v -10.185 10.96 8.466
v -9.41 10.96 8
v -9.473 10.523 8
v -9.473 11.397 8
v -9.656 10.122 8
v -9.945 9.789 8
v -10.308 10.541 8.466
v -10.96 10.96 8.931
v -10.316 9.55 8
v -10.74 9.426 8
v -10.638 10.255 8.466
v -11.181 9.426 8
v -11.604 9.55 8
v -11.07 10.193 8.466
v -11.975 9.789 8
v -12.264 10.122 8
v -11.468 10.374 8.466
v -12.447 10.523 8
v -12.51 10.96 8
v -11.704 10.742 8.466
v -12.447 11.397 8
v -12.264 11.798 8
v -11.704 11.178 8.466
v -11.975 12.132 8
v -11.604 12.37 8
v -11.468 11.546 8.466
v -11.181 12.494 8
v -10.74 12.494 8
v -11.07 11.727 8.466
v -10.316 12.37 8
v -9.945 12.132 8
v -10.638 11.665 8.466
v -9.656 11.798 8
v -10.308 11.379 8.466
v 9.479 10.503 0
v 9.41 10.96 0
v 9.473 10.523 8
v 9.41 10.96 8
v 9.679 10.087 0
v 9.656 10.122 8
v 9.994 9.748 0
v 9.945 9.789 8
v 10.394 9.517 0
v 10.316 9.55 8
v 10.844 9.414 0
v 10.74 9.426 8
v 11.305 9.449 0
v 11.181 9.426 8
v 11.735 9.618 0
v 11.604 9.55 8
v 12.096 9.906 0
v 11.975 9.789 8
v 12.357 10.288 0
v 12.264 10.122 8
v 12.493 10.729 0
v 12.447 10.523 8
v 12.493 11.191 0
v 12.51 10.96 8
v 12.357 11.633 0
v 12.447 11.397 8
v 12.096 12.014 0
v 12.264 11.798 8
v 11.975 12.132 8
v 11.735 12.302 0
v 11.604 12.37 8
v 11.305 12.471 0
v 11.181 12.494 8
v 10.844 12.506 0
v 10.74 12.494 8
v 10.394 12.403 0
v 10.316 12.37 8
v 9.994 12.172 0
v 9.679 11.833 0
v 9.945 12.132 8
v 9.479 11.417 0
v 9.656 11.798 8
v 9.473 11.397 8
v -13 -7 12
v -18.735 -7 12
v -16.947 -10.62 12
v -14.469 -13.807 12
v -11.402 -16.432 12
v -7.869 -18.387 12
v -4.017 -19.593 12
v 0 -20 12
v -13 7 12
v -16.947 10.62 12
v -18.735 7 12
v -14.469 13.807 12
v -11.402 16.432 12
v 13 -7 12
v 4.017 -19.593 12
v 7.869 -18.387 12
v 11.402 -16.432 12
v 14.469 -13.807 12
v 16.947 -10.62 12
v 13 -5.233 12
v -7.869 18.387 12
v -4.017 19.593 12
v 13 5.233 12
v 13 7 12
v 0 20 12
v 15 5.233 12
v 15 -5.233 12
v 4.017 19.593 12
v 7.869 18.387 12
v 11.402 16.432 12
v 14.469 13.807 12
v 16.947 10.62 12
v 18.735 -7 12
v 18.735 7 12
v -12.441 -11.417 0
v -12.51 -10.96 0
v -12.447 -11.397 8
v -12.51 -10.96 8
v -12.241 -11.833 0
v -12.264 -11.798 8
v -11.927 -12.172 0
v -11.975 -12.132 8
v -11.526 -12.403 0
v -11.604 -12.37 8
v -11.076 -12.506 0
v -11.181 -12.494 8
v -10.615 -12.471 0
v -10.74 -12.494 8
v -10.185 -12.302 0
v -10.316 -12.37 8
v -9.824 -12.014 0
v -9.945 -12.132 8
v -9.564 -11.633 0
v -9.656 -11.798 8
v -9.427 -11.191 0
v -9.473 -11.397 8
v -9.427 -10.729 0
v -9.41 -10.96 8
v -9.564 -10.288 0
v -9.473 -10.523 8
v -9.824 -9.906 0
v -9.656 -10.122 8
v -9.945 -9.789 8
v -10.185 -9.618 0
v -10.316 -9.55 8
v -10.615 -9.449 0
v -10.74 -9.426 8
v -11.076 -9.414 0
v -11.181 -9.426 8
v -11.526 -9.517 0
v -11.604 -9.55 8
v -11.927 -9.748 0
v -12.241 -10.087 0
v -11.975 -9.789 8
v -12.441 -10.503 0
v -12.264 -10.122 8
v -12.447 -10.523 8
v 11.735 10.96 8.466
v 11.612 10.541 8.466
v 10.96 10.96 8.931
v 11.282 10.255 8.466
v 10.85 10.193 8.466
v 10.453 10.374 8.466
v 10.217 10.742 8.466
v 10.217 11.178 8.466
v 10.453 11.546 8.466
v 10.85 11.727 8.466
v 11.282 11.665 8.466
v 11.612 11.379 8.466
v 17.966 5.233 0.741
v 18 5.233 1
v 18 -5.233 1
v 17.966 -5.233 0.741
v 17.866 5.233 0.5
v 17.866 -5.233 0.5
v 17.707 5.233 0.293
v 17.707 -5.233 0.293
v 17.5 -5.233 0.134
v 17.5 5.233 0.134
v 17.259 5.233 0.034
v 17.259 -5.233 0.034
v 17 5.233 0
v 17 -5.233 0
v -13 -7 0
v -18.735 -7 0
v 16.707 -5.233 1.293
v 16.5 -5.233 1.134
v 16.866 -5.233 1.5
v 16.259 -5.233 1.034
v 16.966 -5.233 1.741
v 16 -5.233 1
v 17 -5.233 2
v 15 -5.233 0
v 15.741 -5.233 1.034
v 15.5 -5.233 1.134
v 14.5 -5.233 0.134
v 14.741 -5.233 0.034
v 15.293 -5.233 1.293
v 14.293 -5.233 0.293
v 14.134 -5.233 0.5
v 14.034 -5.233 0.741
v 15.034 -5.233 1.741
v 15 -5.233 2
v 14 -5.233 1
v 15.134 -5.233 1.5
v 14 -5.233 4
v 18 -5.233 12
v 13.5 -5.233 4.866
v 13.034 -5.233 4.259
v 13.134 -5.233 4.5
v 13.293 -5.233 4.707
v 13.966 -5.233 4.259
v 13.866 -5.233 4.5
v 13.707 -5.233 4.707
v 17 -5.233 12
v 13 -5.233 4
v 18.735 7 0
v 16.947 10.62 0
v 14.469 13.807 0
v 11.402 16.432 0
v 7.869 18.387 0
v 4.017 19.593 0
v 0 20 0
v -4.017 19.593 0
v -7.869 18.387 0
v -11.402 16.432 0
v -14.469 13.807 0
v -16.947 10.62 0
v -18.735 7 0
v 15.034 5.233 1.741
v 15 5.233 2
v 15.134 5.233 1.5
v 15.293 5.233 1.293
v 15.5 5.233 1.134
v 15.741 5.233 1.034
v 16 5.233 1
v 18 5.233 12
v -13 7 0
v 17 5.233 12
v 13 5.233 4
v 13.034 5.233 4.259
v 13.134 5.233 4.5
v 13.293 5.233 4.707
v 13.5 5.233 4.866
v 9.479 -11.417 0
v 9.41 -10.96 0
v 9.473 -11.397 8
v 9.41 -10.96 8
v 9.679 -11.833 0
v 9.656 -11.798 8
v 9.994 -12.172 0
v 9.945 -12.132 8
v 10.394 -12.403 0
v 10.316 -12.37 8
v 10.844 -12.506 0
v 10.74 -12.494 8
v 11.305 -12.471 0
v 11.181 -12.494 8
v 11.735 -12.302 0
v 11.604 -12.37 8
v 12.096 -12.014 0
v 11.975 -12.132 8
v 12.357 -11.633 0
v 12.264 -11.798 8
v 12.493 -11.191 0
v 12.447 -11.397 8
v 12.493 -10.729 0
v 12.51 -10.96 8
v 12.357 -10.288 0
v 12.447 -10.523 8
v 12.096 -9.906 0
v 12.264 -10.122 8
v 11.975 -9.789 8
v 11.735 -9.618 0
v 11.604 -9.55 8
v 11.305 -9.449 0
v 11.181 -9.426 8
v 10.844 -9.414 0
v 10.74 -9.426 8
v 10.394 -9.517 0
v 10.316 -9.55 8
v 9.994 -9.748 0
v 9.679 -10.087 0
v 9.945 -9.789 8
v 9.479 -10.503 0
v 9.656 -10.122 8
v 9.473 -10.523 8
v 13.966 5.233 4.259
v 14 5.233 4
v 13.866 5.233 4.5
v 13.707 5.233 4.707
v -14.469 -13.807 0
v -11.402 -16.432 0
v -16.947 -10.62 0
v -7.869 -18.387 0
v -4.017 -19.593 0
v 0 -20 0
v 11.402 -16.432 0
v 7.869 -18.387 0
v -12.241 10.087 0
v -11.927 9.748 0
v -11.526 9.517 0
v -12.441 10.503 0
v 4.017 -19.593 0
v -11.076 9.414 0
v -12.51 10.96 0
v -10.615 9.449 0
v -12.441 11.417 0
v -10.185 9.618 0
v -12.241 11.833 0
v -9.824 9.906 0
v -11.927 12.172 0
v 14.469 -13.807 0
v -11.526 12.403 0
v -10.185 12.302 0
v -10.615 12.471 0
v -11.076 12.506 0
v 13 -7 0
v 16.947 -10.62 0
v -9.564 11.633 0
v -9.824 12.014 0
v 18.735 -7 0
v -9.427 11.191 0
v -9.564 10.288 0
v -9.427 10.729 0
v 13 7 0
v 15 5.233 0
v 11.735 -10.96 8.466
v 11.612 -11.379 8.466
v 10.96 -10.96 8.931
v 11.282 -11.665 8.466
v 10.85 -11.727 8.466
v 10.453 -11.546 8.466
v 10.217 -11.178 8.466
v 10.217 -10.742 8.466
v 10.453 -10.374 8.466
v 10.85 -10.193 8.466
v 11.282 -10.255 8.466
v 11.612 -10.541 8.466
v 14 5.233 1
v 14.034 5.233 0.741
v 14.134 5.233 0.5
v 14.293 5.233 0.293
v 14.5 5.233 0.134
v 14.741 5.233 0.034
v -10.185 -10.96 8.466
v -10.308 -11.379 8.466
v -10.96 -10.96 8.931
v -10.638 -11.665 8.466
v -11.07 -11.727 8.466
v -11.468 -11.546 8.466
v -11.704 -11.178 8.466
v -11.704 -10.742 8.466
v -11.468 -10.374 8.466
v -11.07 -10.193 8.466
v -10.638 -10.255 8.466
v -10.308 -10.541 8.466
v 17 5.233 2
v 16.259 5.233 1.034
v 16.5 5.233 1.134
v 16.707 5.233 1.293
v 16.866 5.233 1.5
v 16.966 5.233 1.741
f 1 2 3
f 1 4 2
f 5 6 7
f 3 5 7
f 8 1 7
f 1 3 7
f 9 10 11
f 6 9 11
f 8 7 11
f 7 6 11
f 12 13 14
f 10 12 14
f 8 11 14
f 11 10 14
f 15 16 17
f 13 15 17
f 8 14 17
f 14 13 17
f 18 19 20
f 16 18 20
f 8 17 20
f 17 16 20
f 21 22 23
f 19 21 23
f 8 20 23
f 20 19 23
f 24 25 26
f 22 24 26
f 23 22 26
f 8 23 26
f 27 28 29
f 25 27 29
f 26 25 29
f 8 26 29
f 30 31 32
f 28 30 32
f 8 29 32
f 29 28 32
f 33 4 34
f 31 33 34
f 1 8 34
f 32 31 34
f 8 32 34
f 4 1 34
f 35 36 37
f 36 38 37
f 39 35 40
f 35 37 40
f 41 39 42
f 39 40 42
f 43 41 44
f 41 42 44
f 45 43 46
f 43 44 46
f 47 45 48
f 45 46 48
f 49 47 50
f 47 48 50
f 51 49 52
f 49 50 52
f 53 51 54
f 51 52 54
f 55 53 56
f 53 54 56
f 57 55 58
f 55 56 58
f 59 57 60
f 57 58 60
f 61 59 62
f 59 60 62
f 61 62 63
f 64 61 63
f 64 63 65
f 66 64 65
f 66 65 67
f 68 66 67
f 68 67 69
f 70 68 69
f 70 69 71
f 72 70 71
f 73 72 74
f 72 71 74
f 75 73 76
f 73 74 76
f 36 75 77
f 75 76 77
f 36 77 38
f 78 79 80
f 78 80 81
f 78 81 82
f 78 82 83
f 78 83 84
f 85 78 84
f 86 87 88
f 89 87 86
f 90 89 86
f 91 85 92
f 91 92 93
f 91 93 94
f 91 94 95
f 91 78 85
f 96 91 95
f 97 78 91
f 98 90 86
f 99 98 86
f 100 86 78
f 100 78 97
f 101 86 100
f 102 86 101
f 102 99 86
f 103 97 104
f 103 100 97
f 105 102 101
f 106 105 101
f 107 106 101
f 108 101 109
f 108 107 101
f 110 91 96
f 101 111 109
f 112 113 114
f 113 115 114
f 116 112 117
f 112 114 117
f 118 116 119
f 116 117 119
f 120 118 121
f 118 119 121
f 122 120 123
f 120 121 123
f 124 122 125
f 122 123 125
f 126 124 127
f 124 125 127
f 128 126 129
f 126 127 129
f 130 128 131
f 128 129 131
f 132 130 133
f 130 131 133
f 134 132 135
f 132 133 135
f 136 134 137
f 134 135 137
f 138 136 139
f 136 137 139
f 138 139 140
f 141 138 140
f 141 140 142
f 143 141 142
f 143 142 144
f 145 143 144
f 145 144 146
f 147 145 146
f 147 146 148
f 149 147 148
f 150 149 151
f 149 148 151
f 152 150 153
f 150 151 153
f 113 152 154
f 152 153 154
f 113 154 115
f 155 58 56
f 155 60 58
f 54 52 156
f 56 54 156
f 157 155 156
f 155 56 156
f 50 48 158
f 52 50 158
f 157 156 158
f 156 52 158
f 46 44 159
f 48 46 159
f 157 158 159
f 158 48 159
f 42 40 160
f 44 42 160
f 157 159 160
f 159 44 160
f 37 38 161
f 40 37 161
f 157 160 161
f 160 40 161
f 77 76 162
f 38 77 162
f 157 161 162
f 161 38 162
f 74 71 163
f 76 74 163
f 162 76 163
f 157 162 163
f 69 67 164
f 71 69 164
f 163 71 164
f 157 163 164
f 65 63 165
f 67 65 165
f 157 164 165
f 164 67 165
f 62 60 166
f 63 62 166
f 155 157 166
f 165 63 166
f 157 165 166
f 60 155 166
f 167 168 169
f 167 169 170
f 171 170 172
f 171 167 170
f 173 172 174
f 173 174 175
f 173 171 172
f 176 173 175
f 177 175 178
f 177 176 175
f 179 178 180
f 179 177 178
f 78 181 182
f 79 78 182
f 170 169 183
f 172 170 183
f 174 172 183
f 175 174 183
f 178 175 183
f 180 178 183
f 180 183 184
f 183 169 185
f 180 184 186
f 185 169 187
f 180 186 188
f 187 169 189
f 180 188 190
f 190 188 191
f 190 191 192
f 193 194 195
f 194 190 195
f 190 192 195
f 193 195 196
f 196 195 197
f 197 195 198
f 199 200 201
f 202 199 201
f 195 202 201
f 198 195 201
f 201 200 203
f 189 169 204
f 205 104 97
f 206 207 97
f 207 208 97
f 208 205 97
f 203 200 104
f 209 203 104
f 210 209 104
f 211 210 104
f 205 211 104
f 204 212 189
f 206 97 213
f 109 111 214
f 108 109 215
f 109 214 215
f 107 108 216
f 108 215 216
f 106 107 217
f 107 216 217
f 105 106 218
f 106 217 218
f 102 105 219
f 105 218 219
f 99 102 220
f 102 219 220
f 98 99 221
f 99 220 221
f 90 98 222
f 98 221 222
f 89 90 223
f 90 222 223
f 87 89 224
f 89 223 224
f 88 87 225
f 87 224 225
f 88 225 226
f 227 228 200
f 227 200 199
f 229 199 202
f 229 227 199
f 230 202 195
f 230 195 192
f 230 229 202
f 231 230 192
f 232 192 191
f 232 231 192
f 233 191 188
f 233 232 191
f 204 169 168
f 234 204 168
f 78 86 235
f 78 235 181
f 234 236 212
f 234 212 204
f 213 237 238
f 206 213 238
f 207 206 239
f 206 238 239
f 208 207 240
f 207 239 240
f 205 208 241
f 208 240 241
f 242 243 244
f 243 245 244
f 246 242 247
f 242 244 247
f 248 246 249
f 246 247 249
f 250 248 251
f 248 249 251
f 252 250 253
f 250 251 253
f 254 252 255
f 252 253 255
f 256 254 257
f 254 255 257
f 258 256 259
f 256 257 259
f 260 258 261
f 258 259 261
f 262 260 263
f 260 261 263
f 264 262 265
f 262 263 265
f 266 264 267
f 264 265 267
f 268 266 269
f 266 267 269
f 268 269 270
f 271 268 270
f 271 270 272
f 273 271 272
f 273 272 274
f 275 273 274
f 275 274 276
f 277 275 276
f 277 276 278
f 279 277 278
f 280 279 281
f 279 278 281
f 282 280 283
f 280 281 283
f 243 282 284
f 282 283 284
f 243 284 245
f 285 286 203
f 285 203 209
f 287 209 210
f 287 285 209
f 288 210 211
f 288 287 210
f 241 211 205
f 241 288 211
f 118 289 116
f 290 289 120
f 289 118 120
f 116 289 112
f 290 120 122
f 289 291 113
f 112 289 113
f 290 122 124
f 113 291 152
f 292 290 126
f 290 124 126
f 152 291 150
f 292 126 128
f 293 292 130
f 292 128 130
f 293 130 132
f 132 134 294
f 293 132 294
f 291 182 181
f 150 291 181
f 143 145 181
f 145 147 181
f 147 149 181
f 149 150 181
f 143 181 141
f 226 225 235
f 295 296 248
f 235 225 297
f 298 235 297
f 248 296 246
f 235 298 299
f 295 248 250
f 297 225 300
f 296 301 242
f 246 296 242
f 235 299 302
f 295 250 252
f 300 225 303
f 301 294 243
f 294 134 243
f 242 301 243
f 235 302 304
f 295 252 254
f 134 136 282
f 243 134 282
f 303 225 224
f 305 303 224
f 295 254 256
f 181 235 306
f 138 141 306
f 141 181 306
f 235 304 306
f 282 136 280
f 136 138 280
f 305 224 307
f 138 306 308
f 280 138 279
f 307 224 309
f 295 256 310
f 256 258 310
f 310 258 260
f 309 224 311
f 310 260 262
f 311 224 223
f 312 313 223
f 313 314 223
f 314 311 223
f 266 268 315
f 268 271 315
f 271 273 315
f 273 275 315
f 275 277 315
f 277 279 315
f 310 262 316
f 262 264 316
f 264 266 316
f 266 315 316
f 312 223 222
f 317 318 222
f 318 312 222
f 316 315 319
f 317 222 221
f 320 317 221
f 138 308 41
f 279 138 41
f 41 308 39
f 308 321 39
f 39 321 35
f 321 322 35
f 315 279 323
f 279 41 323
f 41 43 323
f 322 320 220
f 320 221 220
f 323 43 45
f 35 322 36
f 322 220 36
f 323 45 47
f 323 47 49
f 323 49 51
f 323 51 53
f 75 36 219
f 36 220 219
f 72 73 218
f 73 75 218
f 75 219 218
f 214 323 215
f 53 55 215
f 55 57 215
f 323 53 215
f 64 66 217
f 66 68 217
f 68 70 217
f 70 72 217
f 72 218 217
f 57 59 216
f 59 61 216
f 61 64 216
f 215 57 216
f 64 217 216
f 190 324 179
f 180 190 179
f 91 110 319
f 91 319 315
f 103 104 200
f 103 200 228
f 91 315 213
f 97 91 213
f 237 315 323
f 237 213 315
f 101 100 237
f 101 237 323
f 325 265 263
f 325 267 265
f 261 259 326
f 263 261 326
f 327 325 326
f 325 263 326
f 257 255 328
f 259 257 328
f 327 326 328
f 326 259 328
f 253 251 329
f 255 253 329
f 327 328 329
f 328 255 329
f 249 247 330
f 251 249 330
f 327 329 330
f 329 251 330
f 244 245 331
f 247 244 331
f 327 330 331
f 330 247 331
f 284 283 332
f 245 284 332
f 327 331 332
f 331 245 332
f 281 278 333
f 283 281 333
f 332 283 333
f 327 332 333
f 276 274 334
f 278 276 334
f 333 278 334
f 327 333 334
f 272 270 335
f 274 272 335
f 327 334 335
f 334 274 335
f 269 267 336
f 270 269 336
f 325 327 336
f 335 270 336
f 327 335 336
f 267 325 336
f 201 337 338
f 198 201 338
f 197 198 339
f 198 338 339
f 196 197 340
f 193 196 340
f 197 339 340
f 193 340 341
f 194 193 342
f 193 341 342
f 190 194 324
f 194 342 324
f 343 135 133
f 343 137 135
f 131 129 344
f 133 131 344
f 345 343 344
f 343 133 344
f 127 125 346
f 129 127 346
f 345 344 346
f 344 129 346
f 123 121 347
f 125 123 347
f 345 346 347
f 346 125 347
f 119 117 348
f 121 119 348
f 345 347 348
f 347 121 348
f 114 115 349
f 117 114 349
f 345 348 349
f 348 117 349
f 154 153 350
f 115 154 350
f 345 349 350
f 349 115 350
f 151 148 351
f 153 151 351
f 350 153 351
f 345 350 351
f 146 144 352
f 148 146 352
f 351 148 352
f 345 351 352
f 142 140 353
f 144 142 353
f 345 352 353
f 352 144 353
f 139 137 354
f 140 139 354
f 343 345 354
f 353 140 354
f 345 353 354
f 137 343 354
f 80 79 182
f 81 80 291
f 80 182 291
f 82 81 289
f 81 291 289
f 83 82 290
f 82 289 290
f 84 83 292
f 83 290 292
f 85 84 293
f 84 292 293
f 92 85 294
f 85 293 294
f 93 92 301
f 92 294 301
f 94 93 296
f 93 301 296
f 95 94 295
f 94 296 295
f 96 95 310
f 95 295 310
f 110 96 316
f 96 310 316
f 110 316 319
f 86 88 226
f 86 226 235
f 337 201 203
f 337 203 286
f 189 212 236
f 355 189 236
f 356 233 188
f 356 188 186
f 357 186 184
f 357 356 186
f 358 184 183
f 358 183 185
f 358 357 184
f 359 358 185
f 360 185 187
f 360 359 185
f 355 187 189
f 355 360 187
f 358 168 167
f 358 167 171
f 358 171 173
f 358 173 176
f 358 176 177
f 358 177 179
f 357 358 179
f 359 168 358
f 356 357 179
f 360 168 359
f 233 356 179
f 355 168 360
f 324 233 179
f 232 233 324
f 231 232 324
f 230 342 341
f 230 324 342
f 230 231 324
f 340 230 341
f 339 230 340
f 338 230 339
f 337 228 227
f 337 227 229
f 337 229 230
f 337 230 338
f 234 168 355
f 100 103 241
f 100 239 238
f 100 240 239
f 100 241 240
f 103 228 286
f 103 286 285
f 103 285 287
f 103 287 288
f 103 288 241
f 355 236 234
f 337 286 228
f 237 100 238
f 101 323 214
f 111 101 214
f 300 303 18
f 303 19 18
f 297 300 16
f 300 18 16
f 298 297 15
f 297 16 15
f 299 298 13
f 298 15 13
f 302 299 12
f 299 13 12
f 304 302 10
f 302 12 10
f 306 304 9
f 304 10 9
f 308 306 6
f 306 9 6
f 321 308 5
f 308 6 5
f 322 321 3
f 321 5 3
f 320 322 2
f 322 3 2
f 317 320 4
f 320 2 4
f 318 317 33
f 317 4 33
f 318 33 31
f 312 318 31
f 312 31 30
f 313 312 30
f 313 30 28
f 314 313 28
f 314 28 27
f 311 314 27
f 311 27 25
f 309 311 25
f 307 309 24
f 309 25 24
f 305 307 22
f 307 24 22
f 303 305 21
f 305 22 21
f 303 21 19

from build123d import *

# Parameters (mm, degrees)
F0_R         = 20
F1_DEPTH     = 12
F3_D         = 3.1
F3_DEPTH     = 8
F3_TIP       = 0.9313339595
F5_DEPTH     = 12.001
F6_W         = 5
F6_H         = 10.46546828
F7_DEPTH     = 12
F8_W         = 2
F8_H         = 10.46546828
F9_DEPTH     = 11
F10_W        = 1
F10_H        = 10.46546828
F11_DEPTH    = 5
F12_T1_DEPTH = 10.46546828
F12_T3_DEPTH = 10.46546828


# Not quite as in the source:
# - a fillet or chamfer that OpenCascade refuses, or shapes differently, is made with other operations: its cross-section is extruded or revolved along the edge and cut away or added


with BuildPart() as f1:
    # F0 (on Top) → F1 (new body)
    with BuildSketch(Plane.XY):
        Circle(F0_R)
    extrude(amount=F1_DEPTH)

    # F3
    with Locations(Plane(origin=(0, 0, 0), x_dir=(1, 0, 0), z_dir=(0, 0, -1))):
        with Locations((-10.9601551084, 10.9601551084), (-10.9601551084, -10.9601551084), (10.9601551084, -10.9601551084), (10.9601551084, 10.9601551084)):
            Hole(F3_D / 2, depth=F3_DEPTH)
            with Locations((0, 0, -(F3_DEPTH + F3_TIP / 2))):  # 118° drill point
                Cone(0, F3_D / 2, F3_TIP, mode=Mode.SUBTRACT)

    # F4 (on face) → F5 (intersect, through all)
    with BuildSketch(Plane.XY.offset(12)):
        with BuildLine():
            Line((13, -7), (13, 7))
            Line((13, 7), (18.7349939952, 7))
            ThreePointArc((18.7349939952, 7), (0, 20), (-18.7349939952, 7))
            Line((-18.7349939952, 7), (-13, 7))
            Line((-13, 7), (-13, -7))
            Line((-13, -7), (-18.7349939952, -7))
            ThreePointArc((-18.7349939952, -7), (0, -20), (18.7349939952, -7))
            Line((18.7349939952, -7), (13, -7))
        make_face()
    extrude(amount=-F5_DEPTH, mode=Mode.INTERSECT)

    # F6 (on Top) → F7 (join)
    with BuildSketch(Plane.XY):
        with Locations((15.5, 0)):
            Rectangle(F6_W, F6_H)
    extrude(amount=F7_DEPTH)

    # F8 (on face) → F9 (cut)
    with BuildSketch(Plane.XY.offset(12)):
        with Locations((16, 0)):
            Rectangle(F8_W, F8_H)
    extrude(amount=-F9_DEPTH, mode=Mode.SUBTRACT)

    # F10 (on Top) → F11 (cut)
    with BuildSketch(Plane.XY):
        with Locations((13.5, 0)):
            Rectangle(F10_W, F10_H)
    extrude(amount=F11_DEPTH, mode=Mode.SUBTRACT)

    # F12: fillet of radius 1 on 6 edges, made by hand

    # F12_s2 → F12_t1 (join)
    with BuildSketch(Plane.XZ.offset(-5.23273414)):
        with BuildLine():
            ThreePointArc((15, 2), (15.2928932188, 1.2928932188), (16, 1))
            Line((16, 1), (15, 1))
            Line((15, 1), (15, 2))
        make_face()
        with BuildLine():
            ThreePointArc((16, 1), (16.7071067812, 1.2928932188), (17, 2))
            Line((17, 2), (17, 1))
            Line((17, 1), (16, 1))
        make_face()
        with BuildLine():
            ThreePointArc((14, 4), (13.7071067812, 4.7071067812), (13, 5))
            Line((13, 5), (14, 5))
            Line((14, 5), (14, 4))
        make_face()
        with BuildLine():
            ThreePointArc((13, 4), (13.2928932188, 4.7071067812), (14, 5))
            Line((14, 5), (13, 5))
            Line((13, 5), (13, 4))
        make_face()
    extrude(amount=F12_T1_DEPTH)

    # F12_s4 → F12_t3 (cut)
    with BuildSketch(Plane.XZ.offset(-5.23273414)):
        with BuildLine():
            ThreePointArc((18, 1), (17.7071067812, 0.2928932188), (17, 0))
            Line((17, 0), (18, 0))
            Line((18, 0), (18, 1))
        make_face()
        with BuildLine():
            ThreePointArc((14, 1), (14.2928932188, 0.2928932188), (15, 0))
            Line((15, 0), (14, 0))
            Line((14, 0), (14, 1))
        make_face()
    extrude(amount=F12_T3_DEPTH, mode=Mode.SUBTRACT)


solid = f1.part
